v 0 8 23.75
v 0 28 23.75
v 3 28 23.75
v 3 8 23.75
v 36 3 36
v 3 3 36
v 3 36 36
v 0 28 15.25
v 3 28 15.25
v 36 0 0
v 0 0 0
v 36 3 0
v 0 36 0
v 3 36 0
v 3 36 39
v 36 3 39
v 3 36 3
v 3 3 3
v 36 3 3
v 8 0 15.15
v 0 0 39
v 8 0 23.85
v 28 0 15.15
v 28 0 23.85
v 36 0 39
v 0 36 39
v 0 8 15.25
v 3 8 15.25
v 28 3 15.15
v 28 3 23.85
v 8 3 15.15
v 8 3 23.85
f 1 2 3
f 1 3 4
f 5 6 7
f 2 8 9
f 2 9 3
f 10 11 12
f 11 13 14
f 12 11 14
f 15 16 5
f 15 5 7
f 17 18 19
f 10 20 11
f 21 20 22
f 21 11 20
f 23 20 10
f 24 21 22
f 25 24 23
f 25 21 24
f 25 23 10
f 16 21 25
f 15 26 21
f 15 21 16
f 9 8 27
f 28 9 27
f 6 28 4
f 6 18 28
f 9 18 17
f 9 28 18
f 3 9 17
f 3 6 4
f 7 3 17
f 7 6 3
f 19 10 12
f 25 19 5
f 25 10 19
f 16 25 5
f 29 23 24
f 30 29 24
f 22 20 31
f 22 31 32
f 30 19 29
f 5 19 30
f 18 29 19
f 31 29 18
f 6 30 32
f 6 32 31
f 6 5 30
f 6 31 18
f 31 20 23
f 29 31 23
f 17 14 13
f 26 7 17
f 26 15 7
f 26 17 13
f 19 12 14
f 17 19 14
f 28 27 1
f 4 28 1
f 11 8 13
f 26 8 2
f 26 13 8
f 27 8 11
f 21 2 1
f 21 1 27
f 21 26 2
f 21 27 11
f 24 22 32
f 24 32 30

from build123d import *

# Parameters (mm, degrees)
F1_DEPTH = 3
F3_DEPTH = 16.5
F5_W     = 20
F5_H     = 8.7
F6_DEPTH = 25
F7_W     = 20
F7_H     = 8.5
F8_DEPTH = 25


with BuildPart() as f1:
    # F0 (on Top) → F1 (new body)
    with BuildSketch(Plane.XY):
        Polygon((0, 36), (0, 0), (36, 0), (36, 3), (3, 36), align=None)
    extrude(amount=F1_DEPTH)

    # F2 (on face) → F3 (join)
    with BuildSketch(Plane.XY.offset(3)):
        Polygon((3, 3), (3, 36), (0, 36), (0, 0), (36, 0), (36, 3), align=None)
    extrude(amount=F3_DEPTH)

    # F4: F1 across face


with BuildPart() as f1_1:
    add(f1.part)
    add(f1.part.mirror(Plane(origin=(10.1086956522, 10.1086956522, 19.5), x_dir=(1, 0, 0), z_dir=(0, 0, 1))))

    # F5 (on face) → F6 (cut)
    with BuildSketch(Plane.XZ):
        with Locations((18, 19.5)):
            Rectangle(F5_W, F5_H)
    extrude(amount=-F6_DEPTH, mode=Mode.SUBTRACT)

    # F7 (on face) → F8 (cut)
    with BuildSketch(Plane(origin=(0, 0, 0), x_dir=(0, -1, 0), z_dir=(-1, 0, 0))):
        with Locations((-18, 19.5)):
            Rectangle(F7_W, F7_H)
    extrude(amount=-F8_DEPTH, mode=Mode.SUBTRACT)


solid = f1_1.part
